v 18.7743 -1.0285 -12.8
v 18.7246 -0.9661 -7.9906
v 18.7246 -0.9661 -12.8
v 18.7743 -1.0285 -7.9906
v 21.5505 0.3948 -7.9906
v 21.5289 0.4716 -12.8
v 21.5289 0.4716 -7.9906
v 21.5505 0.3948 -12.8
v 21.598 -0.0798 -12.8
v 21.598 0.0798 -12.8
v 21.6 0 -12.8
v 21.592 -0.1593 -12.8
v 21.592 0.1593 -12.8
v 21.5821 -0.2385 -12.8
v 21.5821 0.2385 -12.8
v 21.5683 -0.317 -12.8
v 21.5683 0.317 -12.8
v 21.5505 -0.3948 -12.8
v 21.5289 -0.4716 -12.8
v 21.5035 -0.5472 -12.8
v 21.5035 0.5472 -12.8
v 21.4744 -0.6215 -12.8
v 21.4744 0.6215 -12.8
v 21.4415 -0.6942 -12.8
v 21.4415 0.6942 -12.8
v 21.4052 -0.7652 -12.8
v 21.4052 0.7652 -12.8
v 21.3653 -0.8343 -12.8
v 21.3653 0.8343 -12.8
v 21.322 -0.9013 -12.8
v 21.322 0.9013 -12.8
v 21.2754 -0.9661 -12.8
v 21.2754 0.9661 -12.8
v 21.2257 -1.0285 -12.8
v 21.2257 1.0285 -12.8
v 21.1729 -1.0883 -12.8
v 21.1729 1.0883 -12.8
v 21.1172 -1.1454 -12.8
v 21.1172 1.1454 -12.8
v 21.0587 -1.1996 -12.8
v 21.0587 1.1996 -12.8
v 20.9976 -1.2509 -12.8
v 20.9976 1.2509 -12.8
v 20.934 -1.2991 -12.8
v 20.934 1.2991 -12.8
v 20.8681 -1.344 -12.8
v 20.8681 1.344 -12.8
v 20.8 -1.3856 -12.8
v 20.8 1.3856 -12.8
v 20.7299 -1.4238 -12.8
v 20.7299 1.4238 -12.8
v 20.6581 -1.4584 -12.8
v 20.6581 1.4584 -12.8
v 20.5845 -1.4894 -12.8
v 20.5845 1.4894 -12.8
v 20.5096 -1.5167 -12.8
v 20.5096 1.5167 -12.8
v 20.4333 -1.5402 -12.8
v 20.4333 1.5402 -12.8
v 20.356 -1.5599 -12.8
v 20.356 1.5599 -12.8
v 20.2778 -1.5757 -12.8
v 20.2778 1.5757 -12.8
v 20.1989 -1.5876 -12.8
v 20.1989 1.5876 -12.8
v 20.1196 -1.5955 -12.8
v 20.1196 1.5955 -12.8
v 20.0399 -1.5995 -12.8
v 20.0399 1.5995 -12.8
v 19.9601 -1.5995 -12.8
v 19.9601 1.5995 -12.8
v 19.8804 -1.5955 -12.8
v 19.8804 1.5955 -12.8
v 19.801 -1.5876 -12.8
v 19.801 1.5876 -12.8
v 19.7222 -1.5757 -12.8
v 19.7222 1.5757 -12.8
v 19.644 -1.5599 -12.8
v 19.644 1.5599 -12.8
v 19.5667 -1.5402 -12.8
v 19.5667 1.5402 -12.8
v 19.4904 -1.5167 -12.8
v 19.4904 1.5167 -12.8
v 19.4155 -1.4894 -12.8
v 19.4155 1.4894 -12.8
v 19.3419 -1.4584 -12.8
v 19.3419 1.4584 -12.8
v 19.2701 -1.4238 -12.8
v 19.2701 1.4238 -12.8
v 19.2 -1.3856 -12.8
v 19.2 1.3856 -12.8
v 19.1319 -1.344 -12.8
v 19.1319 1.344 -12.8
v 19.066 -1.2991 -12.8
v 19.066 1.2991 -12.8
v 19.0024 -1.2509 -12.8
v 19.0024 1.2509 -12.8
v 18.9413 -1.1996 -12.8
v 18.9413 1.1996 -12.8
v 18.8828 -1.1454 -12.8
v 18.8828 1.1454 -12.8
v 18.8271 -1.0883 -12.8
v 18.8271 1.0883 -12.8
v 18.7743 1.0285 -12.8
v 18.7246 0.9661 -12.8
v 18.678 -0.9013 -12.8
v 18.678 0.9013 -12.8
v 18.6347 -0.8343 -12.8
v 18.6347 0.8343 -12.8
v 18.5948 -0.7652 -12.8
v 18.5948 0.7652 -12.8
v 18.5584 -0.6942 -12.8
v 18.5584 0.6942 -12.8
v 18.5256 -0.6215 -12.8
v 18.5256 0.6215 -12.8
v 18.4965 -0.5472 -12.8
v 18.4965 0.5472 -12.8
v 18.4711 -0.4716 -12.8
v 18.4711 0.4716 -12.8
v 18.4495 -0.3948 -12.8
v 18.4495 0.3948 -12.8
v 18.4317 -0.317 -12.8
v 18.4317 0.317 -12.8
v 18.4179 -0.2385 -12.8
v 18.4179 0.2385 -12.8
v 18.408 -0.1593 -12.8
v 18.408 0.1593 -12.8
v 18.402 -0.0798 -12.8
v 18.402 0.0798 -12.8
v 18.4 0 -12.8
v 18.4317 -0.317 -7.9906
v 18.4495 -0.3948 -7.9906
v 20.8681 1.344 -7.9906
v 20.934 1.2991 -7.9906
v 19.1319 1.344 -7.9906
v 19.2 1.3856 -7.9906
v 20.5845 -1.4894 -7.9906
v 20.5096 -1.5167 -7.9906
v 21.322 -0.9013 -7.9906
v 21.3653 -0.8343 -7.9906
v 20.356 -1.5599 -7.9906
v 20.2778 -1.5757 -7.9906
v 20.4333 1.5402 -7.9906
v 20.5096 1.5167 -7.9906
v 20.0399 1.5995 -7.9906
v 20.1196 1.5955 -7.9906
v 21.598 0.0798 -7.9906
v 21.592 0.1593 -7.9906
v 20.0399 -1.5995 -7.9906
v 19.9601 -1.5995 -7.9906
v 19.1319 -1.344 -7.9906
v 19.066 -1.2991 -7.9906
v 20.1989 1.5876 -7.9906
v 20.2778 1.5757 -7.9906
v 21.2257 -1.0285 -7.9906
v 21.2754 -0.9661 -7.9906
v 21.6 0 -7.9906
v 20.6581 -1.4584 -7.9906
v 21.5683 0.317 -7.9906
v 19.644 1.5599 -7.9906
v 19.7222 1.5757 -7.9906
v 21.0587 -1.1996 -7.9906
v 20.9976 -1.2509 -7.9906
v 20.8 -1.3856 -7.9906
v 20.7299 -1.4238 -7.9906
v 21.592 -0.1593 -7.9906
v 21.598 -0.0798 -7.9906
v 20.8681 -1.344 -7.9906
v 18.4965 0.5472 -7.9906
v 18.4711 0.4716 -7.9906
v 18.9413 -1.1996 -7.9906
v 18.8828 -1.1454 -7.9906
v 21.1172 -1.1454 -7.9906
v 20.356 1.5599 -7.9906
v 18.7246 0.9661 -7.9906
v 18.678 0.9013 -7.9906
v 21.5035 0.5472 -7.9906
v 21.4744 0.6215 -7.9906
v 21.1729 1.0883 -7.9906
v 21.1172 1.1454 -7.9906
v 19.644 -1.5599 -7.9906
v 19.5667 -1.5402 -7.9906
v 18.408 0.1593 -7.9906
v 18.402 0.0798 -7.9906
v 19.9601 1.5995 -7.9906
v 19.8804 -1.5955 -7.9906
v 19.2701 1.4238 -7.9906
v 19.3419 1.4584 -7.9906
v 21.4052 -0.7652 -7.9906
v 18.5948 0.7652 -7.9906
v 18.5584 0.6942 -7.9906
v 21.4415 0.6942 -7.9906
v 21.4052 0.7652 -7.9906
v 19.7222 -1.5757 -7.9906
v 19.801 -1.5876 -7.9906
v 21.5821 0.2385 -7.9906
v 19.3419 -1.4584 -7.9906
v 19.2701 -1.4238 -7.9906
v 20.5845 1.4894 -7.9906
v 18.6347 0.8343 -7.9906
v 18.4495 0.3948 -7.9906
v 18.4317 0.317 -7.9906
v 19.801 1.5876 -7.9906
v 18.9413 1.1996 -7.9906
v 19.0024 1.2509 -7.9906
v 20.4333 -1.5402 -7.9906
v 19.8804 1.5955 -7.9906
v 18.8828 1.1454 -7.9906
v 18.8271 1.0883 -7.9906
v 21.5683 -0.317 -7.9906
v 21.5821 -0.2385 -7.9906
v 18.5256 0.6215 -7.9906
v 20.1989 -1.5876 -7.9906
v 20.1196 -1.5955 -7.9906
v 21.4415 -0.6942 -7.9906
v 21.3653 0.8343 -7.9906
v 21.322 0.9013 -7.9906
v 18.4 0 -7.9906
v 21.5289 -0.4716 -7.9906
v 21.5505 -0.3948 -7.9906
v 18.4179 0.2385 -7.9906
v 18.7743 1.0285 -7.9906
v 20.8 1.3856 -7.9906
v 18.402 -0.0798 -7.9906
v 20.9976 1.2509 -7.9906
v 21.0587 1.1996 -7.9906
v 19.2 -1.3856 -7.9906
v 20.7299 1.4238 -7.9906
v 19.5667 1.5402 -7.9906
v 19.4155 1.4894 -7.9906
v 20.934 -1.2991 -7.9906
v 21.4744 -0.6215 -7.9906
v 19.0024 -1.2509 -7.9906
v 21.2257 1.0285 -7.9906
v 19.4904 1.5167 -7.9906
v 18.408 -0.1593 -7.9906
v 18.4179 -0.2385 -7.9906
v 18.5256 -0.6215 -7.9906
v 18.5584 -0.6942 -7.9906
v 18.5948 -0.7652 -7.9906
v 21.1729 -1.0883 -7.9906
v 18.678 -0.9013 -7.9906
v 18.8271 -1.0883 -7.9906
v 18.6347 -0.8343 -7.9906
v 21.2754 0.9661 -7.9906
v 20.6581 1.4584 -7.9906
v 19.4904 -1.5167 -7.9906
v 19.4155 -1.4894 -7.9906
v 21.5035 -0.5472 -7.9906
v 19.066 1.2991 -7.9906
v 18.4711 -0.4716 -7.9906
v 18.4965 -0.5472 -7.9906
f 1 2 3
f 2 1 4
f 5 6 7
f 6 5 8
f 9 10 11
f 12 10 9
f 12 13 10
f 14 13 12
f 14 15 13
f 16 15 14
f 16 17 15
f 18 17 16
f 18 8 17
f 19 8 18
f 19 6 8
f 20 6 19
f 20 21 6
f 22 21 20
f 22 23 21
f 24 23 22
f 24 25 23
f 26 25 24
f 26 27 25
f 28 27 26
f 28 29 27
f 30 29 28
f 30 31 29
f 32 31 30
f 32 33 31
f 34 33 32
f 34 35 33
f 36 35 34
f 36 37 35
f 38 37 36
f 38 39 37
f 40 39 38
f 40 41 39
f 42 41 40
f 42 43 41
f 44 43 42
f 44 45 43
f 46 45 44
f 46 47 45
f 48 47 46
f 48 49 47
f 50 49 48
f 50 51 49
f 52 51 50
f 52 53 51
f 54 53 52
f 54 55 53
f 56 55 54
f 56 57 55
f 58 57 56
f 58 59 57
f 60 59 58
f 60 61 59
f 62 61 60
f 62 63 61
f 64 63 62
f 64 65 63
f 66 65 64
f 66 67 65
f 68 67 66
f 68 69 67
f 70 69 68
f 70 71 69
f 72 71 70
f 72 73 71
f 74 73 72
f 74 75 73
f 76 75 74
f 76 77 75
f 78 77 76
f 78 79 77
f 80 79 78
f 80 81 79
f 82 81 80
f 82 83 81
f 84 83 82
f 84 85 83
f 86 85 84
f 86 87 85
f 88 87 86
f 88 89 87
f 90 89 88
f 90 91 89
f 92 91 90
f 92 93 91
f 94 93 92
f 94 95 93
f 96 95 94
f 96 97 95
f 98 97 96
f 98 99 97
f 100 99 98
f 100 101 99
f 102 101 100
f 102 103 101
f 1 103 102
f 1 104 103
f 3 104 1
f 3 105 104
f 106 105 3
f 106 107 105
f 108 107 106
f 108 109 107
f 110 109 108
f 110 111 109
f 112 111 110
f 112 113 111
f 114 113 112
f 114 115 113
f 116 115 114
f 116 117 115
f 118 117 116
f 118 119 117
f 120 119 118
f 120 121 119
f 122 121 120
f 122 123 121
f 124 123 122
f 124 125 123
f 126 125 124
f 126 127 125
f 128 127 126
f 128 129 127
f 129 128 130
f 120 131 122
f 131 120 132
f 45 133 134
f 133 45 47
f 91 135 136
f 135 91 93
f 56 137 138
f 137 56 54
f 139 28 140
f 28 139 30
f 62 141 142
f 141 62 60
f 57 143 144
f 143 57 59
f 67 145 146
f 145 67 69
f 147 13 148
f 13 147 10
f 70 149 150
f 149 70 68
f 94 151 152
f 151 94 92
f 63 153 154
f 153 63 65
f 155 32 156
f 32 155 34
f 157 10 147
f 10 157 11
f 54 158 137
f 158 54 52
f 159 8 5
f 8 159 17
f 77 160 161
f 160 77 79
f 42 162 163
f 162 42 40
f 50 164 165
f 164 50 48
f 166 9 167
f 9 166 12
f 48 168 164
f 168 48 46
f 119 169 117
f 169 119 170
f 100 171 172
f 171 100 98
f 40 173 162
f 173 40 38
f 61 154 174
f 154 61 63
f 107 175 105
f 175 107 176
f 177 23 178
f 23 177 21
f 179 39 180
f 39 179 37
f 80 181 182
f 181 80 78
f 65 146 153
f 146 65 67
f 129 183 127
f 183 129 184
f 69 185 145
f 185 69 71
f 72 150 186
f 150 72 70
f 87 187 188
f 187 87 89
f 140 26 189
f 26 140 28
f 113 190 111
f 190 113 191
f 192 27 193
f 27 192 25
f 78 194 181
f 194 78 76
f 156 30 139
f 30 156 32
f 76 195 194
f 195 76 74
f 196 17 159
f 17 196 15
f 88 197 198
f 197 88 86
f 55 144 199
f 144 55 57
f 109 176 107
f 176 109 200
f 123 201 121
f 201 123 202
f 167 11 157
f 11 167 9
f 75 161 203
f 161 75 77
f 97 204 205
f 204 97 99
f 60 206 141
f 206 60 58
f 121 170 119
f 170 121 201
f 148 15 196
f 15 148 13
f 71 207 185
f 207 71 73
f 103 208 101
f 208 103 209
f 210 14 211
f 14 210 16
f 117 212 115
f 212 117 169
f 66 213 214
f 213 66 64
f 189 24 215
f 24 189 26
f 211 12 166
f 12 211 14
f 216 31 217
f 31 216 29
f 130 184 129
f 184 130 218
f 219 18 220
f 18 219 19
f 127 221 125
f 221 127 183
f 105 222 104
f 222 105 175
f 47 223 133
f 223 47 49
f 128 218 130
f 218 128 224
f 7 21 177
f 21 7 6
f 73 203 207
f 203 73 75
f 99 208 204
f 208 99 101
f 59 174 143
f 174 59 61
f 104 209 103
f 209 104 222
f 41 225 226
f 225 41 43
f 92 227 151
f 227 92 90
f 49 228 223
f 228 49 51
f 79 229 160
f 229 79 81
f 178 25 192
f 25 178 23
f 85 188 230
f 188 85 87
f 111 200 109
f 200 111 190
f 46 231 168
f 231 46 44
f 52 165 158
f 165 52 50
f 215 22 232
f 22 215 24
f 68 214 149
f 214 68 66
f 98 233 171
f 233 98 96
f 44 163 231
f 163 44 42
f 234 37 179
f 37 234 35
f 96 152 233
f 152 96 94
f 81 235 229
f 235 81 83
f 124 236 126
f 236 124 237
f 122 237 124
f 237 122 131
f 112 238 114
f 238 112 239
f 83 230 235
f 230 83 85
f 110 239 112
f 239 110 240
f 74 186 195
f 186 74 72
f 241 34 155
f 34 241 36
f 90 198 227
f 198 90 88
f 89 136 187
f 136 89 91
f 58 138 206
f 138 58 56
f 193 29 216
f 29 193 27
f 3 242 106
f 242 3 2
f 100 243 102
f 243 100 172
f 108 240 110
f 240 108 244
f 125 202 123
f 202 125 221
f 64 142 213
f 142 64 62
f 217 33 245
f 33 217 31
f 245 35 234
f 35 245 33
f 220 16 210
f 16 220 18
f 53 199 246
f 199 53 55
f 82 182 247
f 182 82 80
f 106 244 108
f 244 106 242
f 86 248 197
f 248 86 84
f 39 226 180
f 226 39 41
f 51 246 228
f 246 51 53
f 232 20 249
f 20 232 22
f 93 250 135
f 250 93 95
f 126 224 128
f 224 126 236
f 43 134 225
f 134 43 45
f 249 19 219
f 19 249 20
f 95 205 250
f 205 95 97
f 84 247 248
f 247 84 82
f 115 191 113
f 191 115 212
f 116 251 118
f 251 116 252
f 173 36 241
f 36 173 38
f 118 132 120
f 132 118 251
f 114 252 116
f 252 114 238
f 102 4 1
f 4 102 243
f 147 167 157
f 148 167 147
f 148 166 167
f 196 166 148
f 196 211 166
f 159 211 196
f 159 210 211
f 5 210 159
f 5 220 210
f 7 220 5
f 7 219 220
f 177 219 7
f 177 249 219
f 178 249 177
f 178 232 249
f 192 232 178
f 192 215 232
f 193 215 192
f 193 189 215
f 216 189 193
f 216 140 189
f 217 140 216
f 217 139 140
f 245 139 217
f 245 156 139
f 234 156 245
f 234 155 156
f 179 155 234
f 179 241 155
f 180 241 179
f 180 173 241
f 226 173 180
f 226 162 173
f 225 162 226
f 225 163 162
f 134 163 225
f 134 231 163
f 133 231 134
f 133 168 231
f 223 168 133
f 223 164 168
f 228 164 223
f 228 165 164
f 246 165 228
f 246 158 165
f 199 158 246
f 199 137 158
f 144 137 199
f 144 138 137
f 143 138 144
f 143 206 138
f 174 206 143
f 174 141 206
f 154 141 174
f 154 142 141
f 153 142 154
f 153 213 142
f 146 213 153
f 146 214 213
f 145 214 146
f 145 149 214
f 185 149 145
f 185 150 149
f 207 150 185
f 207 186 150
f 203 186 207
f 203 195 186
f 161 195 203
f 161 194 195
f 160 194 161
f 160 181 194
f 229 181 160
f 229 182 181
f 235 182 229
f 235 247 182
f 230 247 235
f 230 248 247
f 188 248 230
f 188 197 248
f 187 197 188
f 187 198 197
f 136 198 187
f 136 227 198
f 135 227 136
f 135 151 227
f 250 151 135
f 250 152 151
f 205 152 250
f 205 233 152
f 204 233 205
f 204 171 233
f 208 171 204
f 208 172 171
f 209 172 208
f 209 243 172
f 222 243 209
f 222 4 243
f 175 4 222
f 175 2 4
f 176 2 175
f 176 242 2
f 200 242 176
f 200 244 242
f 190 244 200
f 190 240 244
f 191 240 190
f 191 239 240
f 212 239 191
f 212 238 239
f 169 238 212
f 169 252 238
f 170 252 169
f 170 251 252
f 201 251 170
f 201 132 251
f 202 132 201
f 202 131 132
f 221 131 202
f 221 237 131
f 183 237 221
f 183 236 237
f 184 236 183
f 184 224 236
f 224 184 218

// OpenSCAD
use <../../lib.scad>
use <../../p/2-4stud4.scad>
use <../../p/8/2-4cylo.scad>
use <../../p/8/2-4ndis.scad>
use <../../p/axlehol5.scad>
use <../../p/box5.scad>
use <../../p/rect.scad>
use <../../p/rect2a.scad>
use <../../p/rect3.scad>
use <65635s02.scad>
use <../../p/stud3.scad>
$fa=1; $fs=0.2;
function ldraw_lib__s__65635s01(realsolid=false) = [
// 0 ~Plate  2 x  6 with Side Bricks  1 x  2 x  1.333 with Axlehole - Brick
// 0 Name: s\65635s01.dat
// 0 Author: Magnus Forsberg [MagFors]
// 0 !LDRAW_ORG Subpart UPDATE 2022-04
// 0 !LICENSE Licensed under CC BY 2.0 and CC BY 4.0 : see CAreadme.txt
// 
// 0 BFC CERTIFY CCW
  [0,"BFC","CERTIFY"],
  [0,"BFC","CCW"],
// 
// 0 !HISTORY 2022-07-18 [PTadmin] Official Update 2022-04
// 
// 
// 1 16 50 20 0 0 0 -1 0 -3 0 1 0 0 stud3.dat
  [1,16,50,20,0,0,0,-1,0,-3,0,1,0,0, ldraw_lib__stud3(realsolid)],
// 0 BFC INVERTNEXT
  [0,"BFC","INVERTNEXT"],
// 1 16 50 32 0 0 0 -6 0 -12 0 16 0 0 box5.dat
  [1,16,50,32,0,0,0,-6,0,-12,0,16,0,0, ldraw_lib__box5(realsolid)],
// 4 16 40 32 16 44 32 16 44 32 -16 40 32 -16
  [4,16,40,32,16,44,32,16,44,32,-16,40,32,-16],
// 4 16 60 32 -20 56 32 -16 56 32 16 60 32 20
  [4,16,60,32,-20,56,32,-16,56,32,16,60,32,20],
// 1 16 40 28 0 0 0 -1 0 -1 0 1 0 0 2-4stud4.dat
  [1,16,40,28,0,0,0,-1,0,-1,0,1,0,0, ldraw_lib__2_4stud4(realsolid)],
// 1 16 40 30 -12 0 1 0 0 0 2 4 0 0 rect2a.dat
  [1,16,40,30,-12,0,1,0,0,0,2,4,0,0, ldraw_lib__rect2a(realsolid)],
// 1 16 40 30 0 0 1 0 0 0 2 6 0 0 rect3.dat
  [1,16,40,30,0,0,1,0,0,0,2,6,0,0, ldraw_lib__rect3(realsolid)],
// 1 16 40 30 12 0 1 0 2 0 0 0 0 -4 rect2a.dat
  [1,16,40,30,12,0,1,0,2,0,0,0,0,-4, ldraw_lib__rect2a(realsolid)],
// 
// 1 16 40 10 0 1 0 0 0 1 0 0 0 1 s\65635s02.dat
  [1,16,40,10,0,1,0,0,0,1,0,0,0,1, ldraw_lib__s__65635s02(realsolid)],
// 1 16 40 10 0 1 0 0 0 -1 0 0 0 1 s\65635s02.dat
  [1,16,40,10,0,1,0,0,0,-1,0,0,0,1, ldraw_lib__s__65635s02(realsolid)],
// 1 16 40 10 0 1 0 0 0 1 0 0 0 -1 s\65635s02.dat
  [1,16,40,10,0,1,0,0,0,1,0,0,0,-1, ldraw_lib__s__65635s02(realsolid)],
// 1 16 40 10 0 1 0 0 0 -1 0 0 0 -1 s\65635s02.dat
  [1,16,40,10,0,1,0,0,0,-1,0,0,0,-1, ldraw_lib__s__65635s02(realsolid)],
// 
// 1 16 40 10 0 0 20 0 -1 0 0 0 0 1 axlehol5.dat
  [1,16,40,10,0,0,20,0,-1,0,0,0,0,1, ldraw_lib__axlehol5(realsolid)],
// 0 BFC INVERTNEXT
  [0,"BFC","INVERTNEXT"],
// 1 16 60 10 9 0 -20 0 1 0 0 0 0 1 8\2-4cylo.dat
  [1,16,60,10,9,0,-20,0,1,0,0,0,0,1, ldraw_lib__8__2_4cylo(realsolid)],
// 1 16 60 10 9 0 -1 0 1 0 0 0 0 1 8\2-4ndis.dat
  [1,16,60,10,9,0,-1,0,1,0,0,0,0,1, ldraw_lib__8__2_4ndis(realsolid)],
// 1 16 40 10 9 0 1 0 1 0 0 0 0 1 8\2-4ndis.dat
  [1,16,40,10,9,0,1,0,1,0,0,0,0,1, ldraw_lib__8__2_4ndis(realsolid)],
// 0 BFC INVERTNEXT
  [0,"BFC","INVERTNEXT"],
// 1 16 60 10 -9 0 -20 0 1 0 0 0 0 -1 8\2-4cylo.dat
  [1,16,60,10,-9,0,-20,0,1,0,0,0,0,-1, ldraw_lib__8__2_4cylo(realsolid)],
// 1 16 60 10 -9 0 -1 0 1 0 0 0 0 -1 8\2-4ndis.dat
  [1,16,60,10,-9,0,-1,0,1,0,0,0,0,-1, ldraw_lib__8__2_4ndis(realsolid)],
// 1 16 40 10 -9 0 1 0 1 0 0 0 0 -1 8\2-4ndis.dat
  [1,16,40,10,-9,0,1,0,1,0,0,0,0,-1, ldraw_lib__8__2_4ndis(realsolid)],
// 2 24 40 24 20 40 0 20
  [2,24,40,24,20,40,0,20],
// 2 24 60 32 20 60 0 20
  [2,24,60,32,20,60,0,20],
// 2 24 40 24 -20 40 0 -20
  [2,24,40,24,-20,40,0,-20],
// 2 24 60 32 -20 60 0 -20
  [2,24,60,32,-20,60,0,-20],
// 4 16 40 24 20 40 0 20 60 0 20 60 32 20
  [4,16,40,24,20,40,0,20,60,0,20,60,32,20],
// 4 16 40 24 -20 60 32 -20 60 0 -20 40 0 -20
  [4,16,40,24,-20,60,32,-20,60,0,-20,40,0,-20],
// 1 16 50 0 0 0 0 10 0 1 0 -20 0 0 rect.dat
  [1,16,50,0,0,0,0,10,0,1,0,-20,0,0, ldraw_lib__rect(realsolid)],
// 4 16 60 16 16 60 16 -16 60 32 -20 60 32 20
  [4,16,60,16,16,60,16,-16,60,32,-20,60,32,20],
// 4 16 60 4 16 60 16 16 60 32 20 60 0 20
  [4,16,60,4,16,60,16,16,60,32,20,60,0,20],
// 4 16 60 4 16 60 0 20 60 0 -20 60 4 -16
  [4,16,60,4,16,60,0,20,60,0,-20,60,4,-16],
// 4 16 60 16 -16 60 4 -16 60 0 -20 60 32 -20
  [4,16,60,16,-16,60,4,-16,60,0,-20,60,32,-20],
// 4 16 40 16 16 40 4 16 40 0 20 40 24 20
  [4,16,40,16,16,40,4,16,40,0,20,40,24,20],
// 4 16 40 16 16 40 24 20 40 24 -20 40 16 -16
  [4,16,40,16,16,40,24,20,40,24,-20,40,16,-16],
// 4 16 40 4 -16 40 16 -16 40 24 -20 40 0 -20
  [4,16,40,4,-16,40,16,-16,40,24,-20,40,0,-20],
// 4 16 40 4 16 40 4 -16 40 0 -20 40 0 20
  [4,16,40,4,16,40,4,-16,40,0,-20,40,0,20],
// 3 16 60 8 16 60 10 10 60 12 16
  [3,16,60,8,16,60,10,10,60,12,16],
// 3 16 60 10 -10 60 8 -16 60 12 -16
  [3,16,60,10,-10,60,8,-16,60,12,-16],
// 3 16 40 12 16 40 10 10 40 8 16
  [3,16,40,12,16,40,10,10,40,8,16],
// 3 16 40 10 -10 40 12 -16 40 8 -16
  [3,16,40,10,-10,40,12,-16,40,8,-16],
];
module ldraw_lib__s__65635s01(step=0, col=false, unit=2/5, alt=false, line=0.2, solid=!$preview)
    makepoly(ldraw_lib__s__65635s01(solid), step=step, col=col, unit=unit, alt=alt, line=line, solid=solid);
ldraw_lib__s__65635s01(line=0.2);
